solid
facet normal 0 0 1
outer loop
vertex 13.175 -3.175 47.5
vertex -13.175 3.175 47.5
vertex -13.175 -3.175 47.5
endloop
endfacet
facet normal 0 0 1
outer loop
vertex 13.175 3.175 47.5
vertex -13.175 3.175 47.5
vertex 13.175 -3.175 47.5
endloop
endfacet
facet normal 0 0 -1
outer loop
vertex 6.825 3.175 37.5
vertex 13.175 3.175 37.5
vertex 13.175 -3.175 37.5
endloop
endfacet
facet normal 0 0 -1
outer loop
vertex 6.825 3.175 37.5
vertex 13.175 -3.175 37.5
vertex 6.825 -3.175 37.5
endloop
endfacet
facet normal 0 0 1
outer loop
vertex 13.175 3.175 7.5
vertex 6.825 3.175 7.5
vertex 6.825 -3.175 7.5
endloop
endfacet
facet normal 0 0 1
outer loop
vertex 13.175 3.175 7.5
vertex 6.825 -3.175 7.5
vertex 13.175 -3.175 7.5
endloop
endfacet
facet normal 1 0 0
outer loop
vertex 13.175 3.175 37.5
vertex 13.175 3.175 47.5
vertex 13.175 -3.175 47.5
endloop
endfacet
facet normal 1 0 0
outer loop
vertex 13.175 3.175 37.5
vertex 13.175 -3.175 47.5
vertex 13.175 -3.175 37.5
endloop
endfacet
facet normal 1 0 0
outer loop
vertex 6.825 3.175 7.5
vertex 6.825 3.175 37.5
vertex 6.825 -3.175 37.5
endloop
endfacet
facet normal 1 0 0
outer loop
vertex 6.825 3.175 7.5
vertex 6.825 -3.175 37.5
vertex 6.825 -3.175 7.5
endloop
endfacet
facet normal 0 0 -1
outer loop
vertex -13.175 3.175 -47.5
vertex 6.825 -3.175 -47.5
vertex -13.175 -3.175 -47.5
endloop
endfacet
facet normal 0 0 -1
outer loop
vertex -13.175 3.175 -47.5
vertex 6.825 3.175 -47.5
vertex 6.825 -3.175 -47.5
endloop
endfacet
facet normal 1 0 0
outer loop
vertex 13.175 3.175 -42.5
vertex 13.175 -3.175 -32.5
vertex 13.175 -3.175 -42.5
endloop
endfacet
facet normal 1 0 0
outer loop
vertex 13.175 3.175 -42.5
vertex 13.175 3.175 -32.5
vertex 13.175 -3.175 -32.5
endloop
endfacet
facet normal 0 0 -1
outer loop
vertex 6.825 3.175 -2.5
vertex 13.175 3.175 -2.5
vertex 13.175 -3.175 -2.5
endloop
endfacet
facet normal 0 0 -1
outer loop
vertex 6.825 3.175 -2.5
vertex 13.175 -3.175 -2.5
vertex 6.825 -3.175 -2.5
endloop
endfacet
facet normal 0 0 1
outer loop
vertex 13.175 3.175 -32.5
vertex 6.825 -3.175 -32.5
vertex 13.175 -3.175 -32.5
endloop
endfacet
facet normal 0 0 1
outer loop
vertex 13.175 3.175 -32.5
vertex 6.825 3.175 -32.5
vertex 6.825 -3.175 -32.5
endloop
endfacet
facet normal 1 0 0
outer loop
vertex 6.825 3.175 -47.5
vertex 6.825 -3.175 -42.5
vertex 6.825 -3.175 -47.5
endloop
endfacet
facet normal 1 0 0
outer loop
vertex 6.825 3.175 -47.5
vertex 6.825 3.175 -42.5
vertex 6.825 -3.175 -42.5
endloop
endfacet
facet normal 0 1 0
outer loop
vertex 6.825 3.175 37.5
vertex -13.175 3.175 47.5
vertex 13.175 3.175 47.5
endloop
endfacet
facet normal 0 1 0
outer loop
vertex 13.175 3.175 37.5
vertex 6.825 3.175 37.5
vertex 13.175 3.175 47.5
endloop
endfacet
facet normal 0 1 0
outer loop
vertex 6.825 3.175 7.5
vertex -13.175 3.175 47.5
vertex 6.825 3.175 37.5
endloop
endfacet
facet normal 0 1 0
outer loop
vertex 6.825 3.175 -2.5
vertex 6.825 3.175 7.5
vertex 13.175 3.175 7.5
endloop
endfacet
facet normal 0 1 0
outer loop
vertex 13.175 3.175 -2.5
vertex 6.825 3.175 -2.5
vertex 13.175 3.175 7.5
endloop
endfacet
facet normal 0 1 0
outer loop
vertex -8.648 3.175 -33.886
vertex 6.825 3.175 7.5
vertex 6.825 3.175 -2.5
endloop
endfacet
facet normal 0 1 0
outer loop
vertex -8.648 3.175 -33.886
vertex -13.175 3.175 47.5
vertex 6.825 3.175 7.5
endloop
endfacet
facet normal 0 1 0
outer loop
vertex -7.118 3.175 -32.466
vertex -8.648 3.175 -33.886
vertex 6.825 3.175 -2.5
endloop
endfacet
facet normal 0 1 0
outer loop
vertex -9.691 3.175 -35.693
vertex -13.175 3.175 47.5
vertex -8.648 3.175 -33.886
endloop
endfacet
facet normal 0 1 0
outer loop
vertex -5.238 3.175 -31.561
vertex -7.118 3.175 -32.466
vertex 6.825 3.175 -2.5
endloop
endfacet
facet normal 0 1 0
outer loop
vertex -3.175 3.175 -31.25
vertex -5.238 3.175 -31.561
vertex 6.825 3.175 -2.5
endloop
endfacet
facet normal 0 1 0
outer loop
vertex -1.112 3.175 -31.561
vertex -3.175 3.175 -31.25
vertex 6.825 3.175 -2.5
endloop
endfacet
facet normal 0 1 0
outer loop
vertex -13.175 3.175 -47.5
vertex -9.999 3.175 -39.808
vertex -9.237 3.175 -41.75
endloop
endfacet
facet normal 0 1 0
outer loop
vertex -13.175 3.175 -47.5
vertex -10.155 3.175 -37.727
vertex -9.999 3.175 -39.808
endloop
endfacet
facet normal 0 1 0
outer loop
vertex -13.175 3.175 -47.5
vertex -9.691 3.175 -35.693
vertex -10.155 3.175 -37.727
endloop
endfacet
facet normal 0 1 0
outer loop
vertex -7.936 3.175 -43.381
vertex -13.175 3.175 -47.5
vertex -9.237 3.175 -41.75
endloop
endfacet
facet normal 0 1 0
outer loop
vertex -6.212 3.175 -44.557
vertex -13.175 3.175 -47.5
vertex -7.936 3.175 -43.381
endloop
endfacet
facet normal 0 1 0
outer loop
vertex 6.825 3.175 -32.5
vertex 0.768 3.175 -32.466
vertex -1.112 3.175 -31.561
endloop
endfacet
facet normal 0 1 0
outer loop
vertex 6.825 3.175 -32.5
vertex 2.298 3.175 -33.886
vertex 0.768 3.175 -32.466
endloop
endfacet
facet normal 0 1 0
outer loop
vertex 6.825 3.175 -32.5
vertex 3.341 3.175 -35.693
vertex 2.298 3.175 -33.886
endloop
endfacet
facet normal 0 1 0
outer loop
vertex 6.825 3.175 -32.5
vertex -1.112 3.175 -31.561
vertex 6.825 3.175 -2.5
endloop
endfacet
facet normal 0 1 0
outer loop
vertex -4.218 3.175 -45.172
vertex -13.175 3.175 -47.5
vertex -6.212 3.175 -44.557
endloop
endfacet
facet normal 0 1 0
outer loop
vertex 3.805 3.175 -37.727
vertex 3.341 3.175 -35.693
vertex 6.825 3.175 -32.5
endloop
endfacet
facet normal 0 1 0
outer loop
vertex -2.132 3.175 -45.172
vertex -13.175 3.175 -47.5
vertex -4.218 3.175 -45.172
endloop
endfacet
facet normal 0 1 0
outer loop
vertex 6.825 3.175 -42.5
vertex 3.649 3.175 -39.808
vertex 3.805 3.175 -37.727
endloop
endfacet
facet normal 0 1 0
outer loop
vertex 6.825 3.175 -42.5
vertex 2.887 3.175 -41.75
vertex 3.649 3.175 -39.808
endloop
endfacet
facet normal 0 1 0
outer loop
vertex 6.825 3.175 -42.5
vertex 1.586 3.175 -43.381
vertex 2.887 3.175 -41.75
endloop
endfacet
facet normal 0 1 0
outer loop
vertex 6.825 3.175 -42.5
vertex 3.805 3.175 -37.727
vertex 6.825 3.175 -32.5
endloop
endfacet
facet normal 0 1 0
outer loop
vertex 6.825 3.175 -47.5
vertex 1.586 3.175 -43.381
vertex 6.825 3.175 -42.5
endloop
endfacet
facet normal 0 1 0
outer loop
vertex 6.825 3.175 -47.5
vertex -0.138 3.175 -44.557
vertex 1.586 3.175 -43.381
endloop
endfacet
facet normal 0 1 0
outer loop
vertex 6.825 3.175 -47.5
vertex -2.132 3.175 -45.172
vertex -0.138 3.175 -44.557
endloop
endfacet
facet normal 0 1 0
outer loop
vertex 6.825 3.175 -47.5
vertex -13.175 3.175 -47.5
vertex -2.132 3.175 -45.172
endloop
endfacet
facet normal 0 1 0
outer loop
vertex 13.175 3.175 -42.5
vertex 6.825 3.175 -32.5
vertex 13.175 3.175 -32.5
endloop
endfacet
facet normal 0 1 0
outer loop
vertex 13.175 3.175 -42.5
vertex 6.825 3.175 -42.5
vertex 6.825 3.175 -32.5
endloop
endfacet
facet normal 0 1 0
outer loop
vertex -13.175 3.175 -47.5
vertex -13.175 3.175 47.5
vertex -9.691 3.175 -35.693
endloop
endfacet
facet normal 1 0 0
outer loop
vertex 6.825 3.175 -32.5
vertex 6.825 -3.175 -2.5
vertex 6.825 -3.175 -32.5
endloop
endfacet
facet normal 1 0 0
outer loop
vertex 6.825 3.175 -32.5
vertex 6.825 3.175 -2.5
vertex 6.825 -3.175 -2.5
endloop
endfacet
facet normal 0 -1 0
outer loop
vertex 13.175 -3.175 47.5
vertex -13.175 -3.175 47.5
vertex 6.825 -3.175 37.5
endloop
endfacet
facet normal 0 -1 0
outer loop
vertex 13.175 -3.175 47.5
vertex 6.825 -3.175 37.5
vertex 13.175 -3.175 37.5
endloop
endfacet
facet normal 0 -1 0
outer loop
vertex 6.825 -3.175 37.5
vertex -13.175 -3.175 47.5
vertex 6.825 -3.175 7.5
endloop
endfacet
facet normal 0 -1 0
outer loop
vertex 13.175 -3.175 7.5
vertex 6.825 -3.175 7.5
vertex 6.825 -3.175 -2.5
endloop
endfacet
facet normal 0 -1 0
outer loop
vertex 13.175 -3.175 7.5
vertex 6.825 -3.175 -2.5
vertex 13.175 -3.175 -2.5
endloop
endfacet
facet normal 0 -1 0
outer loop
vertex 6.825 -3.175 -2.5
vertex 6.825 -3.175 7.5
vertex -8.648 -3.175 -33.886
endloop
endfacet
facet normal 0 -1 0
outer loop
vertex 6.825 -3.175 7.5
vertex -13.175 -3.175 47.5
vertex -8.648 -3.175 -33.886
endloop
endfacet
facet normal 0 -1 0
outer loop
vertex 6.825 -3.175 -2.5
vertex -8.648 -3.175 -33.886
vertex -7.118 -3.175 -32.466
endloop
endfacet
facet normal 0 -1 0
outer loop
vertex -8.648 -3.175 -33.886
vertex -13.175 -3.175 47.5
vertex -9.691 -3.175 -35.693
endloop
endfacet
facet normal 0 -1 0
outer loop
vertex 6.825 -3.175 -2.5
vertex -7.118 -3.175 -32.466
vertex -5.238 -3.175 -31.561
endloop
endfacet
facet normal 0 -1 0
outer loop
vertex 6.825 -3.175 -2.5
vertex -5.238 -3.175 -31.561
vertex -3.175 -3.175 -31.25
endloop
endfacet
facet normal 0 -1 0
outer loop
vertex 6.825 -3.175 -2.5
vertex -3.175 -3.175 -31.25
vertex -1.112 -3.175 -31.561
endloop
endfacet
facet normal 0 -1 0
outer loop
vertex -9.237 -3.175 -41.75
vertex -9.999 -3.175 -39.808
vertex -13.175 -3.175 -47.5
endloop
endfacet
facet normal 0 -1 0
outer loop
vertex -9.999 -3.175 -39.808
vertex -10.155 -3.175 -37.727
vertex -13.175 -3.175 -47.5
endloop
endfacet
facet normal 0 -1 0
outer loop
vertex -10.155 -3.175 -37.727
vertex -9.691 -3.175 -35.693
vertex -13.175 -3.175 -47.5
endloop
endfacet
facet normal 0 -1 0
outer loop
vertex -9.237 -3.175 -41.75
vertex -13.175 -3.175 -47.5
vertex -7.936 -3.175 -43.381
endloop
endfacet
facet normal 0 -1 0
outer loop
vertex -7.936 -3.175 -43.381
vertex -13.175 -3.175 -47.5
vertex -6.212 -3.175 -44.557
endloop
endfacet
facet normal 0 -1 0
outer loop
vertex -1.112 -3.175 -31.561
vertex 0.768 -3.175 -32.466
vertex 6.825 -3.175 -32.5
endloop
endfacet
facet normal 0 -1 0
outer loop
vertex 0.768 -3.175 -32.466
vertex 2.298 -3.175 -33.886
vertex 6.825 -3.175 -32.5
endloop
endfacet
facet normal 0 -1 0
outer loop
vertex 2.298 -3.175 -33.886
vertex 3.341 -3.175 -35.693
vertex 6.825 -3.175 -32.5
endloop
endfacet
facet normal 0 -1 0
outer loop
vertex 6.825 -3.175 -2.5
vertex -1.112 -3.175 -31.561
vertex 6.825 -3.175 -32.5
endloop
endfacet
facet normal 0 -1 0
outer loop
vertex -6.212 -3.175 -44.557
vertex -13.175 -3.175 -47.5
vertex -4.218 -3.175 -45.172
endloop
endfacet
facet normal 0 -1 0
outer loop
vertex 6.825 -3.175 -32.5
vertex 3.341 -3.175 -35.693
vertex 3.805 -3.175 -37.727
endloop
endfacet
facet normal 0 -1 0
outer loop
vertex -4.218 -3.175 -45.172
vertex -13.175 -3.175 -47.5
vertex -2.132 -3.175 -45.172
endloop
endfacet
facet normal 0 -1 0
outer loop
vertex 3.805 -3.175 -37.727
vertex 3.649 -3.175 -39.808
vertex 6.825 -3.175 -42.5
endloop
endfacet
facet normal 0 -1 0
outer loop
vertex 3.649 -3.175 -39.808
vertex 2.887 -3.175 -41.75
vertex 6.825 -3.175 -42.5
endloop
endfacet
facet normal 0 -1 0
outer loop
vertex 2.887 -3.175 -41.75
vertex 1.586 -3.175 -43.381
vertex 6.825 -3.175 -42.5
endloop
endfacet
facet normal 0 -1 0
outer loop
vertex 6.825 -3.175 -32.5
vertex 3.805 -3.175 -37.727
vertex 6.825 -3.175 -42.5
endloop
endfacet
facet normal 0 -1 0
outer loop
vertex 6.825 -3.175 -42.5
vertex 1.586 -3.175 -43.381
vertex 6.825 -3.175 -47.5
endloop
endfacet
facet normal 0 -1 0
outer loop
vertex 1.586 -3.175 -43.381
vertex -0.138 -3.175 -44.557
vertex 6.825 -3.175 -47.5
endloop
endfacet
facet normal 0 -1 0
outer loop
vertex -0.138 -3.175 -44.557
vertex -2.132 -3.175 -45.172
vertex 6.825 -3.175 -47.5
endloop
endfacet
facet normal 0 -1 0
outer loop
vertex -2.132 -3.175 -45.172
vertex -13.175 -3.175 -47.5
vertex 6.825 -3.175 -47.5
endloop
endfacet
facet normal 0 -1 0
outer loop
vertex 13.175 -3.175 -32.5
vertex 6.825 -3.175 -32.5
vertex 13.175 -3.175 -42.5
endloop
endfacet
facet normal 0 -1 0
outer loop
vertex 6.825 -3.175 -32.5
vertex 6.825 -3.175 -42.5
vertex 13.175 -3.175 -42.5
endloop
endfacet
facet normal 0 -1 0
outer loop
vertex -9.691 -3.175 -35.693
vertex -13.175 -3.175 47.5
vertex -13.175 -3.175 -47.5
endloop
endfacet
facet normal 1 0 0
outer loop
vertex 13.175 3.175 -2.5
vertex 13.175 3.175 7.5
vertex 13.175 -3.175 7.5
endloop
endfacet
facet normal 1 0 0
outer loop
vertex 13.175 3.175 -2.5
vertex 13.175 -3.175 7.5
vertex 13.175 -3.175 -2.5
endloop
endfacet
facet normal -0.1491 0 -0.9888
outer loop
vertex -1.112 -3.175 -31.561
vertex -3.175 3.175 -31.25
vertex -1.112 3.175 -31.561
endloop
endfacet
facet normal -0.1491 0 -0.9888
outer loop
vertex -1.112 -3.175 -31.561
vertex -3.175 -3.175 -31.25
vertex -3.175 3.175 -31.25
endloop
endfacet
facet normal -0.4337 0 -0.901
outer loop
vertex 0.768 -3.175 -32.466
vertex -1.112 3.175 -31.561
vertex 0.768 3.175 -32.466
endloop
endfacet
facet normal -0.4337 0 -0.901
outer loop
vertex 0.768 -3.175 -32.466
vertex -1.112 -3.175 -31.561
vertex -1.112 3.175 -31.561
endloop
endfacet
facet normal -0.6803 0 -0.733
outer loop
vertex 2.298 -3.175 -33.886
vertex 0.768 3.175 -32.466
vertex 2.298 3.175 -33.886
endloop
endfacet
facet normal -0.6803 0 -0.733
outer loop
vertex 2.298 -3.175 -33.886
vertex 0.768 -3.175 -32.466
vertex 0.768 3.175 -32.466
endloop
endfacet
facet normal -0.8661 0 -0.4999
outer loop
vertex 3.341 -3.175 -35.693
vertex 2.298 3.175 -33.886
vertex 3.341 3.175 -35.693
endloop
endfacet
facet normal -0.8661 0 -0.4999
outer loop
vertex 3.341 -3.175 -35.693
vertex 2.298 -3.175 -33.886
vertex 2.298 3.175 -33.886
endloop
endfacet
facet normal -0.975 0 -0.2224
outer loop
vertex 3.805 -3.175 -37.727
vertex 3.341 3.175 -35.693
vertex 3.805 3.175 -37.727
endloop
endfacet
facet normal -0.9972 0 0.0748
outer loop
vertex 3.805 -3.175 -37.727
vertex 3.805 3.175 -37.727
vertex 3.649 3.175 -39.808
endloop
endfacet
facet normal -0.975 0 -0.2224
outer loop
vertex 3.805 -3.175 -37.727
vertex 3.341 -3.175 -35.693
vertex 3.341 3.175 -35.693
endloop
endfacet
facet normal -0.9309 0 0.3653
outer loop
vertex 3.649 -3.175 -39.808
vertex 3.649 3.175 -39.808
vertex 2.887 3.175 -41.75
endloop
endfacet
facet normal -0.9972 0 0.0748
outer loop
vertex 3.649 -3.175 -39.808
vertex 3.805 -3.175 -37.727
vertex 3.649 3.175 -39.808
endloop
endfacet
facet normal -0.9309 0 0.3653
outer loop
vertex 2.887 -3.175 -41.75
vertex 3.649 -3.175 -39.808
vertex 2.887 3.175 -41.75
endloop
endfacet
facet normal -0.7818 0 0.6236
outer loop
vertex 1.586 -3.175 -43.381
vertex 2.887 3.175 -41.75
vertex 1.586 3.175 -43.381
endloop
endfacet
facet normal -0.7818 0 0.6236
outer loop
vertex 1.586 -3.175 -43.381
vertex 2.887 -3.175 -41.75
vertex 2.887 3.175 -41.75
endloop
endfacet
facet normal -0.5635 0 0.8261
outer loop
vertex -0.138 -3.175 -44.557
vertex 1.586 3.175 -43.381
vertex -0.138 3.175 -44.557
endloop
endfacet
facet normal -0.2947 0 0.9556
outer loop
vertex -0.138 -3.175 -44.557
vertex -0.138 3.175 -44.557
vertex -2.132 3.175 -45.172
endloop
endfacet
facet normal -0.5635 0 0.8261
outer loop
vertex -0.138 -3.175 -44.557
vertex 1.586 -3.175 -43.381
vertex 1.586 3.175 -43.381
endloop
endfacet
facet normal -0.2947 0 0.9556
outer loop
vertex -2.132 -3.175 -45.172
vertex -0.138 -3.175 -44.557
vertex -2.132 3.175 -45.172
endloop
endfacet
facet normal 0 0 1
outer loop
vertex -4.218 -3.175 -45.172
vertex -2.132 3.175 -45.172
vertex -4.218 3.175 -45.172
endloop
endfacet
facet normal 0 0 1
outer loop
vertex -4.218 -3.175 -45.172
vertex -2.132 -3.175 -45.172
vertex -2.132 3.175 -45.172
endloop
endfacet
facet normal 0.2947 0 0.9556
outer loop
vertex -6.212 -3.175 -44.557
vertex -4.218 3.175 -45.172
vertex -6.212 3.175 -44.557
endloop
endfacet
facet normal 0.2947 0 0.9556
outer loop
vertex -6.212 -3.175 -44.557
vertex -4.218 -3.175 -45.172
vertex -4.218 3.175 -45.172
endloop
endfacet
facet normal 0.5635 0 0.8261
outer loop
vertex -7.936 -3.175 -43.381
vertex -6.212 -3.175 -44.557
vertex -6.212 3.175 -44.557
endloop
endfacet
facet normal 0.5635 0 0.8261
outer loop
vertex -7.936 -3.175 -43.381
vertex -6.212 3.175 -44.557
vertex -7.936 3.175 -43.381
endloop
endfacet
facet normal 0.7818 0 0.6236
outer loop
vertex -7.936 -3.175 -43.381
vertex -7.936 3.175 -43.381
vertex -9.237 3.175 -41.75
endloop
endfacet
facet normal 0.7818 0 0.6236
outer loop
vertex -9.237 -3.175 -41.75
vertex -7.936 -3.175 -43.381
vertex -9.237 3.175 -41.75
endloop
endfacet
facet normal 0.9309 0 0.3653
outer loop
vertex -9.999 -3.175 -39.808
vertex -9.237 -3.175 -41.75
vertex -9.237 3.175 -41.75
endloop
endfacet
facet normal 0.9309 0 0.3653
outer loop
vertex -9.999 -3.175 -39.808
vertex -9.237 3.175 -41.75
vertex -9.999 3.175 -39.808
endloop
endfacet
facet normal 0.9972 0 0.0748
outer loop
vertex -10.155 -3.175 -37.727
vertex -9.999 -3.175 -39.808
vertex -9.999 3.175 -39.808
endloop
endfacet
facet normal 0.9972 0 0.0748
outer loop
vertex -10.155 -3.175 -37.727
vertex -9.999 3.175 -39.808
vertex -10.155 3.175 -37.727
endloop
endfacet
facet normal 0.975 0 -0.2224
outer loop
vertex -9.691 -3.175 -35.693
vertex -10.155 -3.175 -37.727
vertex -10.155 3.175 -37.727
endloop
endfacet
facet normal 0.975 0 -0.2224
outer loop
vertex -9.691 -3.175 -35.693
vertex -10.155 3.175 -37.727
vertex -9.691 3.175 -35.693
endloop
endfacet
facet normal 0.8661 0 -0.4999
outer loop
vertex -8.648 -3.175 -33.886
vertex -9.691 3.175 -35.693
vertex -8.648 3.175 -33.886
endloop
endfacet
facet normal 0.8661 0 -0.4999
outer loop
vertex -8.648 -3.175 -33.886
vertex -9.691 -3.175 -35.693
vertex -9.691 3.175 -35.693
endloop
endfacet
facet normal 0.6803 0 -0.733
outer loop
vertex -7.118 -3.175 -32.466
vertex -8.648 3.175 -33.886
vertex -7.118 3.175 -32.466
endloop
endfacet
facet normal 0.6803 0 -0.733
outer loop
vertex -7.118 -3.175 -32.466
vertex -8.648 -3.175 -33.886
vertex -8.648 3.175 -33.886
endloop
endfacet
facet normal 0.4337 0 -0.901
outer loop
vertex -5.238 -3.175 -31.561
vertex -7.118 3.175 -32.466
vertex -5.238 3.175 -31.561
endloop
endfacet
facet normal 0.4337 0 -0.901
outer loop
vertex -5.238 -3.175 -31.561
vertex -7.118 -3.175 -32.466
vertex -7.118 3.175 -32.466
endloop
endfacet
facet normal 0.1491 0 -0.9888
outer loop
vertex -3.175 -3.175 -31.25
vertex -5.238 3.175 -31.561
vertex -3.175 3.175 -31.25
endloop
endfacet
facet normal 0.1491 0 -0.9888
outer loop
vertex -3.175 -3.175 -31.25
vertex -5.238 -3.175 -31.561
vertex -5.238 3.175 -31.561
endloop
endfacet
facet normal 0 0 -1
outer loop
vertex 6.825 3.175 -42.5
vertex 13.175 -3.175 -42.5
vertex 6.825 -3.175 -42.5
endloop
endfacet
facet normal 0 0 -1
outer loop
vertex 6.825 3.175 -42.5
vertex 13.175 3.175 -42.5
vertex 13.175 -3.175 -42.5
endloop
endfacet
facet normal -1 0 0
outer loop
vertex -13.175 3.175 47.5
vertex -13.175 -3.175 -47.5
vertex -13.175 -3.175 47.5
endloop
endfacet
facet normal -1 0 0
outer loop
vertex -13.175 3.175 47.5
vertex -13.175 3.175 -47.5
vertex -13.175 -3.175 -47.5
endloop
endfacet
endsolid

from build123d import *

# Parameters (mm, degrees)
SKETCH1_R           = 7
BOSS_EXTRUDE1_DEPTH = 3.175


with BuildPart() as part:
    # Sketch1 → Boss-Extrude1 (new, symmetric)
    with BuildSketch(Plane(origin=(0, 0, 0), x_dir=(1, 0, 0), z_dir=(0, 1, 0))):
        Polygon((-13.175, 47.5), (-13.175, -47.5), (13.175, -47.5), (13.175, -37.5), (6.825, -37.5), (6.825, -7.5), (13.175, -7.5), (13.175, 2.5), (6.825, 2.5), (6.825, 32.5), (13.175, 32.5), (13.175, 42.5), (6.825, 42.5), (6.825, 47.5), align=None)
        with Locations(Location((-3.175, 38.25, 0), (0, 0, 270))):
            Circle(SKETCH1_R, mode=Mode.SUBTRACT)
    extrude(amount=BOSS_EXTRUDE1_DEPTH, both=True)


solid = part.part
